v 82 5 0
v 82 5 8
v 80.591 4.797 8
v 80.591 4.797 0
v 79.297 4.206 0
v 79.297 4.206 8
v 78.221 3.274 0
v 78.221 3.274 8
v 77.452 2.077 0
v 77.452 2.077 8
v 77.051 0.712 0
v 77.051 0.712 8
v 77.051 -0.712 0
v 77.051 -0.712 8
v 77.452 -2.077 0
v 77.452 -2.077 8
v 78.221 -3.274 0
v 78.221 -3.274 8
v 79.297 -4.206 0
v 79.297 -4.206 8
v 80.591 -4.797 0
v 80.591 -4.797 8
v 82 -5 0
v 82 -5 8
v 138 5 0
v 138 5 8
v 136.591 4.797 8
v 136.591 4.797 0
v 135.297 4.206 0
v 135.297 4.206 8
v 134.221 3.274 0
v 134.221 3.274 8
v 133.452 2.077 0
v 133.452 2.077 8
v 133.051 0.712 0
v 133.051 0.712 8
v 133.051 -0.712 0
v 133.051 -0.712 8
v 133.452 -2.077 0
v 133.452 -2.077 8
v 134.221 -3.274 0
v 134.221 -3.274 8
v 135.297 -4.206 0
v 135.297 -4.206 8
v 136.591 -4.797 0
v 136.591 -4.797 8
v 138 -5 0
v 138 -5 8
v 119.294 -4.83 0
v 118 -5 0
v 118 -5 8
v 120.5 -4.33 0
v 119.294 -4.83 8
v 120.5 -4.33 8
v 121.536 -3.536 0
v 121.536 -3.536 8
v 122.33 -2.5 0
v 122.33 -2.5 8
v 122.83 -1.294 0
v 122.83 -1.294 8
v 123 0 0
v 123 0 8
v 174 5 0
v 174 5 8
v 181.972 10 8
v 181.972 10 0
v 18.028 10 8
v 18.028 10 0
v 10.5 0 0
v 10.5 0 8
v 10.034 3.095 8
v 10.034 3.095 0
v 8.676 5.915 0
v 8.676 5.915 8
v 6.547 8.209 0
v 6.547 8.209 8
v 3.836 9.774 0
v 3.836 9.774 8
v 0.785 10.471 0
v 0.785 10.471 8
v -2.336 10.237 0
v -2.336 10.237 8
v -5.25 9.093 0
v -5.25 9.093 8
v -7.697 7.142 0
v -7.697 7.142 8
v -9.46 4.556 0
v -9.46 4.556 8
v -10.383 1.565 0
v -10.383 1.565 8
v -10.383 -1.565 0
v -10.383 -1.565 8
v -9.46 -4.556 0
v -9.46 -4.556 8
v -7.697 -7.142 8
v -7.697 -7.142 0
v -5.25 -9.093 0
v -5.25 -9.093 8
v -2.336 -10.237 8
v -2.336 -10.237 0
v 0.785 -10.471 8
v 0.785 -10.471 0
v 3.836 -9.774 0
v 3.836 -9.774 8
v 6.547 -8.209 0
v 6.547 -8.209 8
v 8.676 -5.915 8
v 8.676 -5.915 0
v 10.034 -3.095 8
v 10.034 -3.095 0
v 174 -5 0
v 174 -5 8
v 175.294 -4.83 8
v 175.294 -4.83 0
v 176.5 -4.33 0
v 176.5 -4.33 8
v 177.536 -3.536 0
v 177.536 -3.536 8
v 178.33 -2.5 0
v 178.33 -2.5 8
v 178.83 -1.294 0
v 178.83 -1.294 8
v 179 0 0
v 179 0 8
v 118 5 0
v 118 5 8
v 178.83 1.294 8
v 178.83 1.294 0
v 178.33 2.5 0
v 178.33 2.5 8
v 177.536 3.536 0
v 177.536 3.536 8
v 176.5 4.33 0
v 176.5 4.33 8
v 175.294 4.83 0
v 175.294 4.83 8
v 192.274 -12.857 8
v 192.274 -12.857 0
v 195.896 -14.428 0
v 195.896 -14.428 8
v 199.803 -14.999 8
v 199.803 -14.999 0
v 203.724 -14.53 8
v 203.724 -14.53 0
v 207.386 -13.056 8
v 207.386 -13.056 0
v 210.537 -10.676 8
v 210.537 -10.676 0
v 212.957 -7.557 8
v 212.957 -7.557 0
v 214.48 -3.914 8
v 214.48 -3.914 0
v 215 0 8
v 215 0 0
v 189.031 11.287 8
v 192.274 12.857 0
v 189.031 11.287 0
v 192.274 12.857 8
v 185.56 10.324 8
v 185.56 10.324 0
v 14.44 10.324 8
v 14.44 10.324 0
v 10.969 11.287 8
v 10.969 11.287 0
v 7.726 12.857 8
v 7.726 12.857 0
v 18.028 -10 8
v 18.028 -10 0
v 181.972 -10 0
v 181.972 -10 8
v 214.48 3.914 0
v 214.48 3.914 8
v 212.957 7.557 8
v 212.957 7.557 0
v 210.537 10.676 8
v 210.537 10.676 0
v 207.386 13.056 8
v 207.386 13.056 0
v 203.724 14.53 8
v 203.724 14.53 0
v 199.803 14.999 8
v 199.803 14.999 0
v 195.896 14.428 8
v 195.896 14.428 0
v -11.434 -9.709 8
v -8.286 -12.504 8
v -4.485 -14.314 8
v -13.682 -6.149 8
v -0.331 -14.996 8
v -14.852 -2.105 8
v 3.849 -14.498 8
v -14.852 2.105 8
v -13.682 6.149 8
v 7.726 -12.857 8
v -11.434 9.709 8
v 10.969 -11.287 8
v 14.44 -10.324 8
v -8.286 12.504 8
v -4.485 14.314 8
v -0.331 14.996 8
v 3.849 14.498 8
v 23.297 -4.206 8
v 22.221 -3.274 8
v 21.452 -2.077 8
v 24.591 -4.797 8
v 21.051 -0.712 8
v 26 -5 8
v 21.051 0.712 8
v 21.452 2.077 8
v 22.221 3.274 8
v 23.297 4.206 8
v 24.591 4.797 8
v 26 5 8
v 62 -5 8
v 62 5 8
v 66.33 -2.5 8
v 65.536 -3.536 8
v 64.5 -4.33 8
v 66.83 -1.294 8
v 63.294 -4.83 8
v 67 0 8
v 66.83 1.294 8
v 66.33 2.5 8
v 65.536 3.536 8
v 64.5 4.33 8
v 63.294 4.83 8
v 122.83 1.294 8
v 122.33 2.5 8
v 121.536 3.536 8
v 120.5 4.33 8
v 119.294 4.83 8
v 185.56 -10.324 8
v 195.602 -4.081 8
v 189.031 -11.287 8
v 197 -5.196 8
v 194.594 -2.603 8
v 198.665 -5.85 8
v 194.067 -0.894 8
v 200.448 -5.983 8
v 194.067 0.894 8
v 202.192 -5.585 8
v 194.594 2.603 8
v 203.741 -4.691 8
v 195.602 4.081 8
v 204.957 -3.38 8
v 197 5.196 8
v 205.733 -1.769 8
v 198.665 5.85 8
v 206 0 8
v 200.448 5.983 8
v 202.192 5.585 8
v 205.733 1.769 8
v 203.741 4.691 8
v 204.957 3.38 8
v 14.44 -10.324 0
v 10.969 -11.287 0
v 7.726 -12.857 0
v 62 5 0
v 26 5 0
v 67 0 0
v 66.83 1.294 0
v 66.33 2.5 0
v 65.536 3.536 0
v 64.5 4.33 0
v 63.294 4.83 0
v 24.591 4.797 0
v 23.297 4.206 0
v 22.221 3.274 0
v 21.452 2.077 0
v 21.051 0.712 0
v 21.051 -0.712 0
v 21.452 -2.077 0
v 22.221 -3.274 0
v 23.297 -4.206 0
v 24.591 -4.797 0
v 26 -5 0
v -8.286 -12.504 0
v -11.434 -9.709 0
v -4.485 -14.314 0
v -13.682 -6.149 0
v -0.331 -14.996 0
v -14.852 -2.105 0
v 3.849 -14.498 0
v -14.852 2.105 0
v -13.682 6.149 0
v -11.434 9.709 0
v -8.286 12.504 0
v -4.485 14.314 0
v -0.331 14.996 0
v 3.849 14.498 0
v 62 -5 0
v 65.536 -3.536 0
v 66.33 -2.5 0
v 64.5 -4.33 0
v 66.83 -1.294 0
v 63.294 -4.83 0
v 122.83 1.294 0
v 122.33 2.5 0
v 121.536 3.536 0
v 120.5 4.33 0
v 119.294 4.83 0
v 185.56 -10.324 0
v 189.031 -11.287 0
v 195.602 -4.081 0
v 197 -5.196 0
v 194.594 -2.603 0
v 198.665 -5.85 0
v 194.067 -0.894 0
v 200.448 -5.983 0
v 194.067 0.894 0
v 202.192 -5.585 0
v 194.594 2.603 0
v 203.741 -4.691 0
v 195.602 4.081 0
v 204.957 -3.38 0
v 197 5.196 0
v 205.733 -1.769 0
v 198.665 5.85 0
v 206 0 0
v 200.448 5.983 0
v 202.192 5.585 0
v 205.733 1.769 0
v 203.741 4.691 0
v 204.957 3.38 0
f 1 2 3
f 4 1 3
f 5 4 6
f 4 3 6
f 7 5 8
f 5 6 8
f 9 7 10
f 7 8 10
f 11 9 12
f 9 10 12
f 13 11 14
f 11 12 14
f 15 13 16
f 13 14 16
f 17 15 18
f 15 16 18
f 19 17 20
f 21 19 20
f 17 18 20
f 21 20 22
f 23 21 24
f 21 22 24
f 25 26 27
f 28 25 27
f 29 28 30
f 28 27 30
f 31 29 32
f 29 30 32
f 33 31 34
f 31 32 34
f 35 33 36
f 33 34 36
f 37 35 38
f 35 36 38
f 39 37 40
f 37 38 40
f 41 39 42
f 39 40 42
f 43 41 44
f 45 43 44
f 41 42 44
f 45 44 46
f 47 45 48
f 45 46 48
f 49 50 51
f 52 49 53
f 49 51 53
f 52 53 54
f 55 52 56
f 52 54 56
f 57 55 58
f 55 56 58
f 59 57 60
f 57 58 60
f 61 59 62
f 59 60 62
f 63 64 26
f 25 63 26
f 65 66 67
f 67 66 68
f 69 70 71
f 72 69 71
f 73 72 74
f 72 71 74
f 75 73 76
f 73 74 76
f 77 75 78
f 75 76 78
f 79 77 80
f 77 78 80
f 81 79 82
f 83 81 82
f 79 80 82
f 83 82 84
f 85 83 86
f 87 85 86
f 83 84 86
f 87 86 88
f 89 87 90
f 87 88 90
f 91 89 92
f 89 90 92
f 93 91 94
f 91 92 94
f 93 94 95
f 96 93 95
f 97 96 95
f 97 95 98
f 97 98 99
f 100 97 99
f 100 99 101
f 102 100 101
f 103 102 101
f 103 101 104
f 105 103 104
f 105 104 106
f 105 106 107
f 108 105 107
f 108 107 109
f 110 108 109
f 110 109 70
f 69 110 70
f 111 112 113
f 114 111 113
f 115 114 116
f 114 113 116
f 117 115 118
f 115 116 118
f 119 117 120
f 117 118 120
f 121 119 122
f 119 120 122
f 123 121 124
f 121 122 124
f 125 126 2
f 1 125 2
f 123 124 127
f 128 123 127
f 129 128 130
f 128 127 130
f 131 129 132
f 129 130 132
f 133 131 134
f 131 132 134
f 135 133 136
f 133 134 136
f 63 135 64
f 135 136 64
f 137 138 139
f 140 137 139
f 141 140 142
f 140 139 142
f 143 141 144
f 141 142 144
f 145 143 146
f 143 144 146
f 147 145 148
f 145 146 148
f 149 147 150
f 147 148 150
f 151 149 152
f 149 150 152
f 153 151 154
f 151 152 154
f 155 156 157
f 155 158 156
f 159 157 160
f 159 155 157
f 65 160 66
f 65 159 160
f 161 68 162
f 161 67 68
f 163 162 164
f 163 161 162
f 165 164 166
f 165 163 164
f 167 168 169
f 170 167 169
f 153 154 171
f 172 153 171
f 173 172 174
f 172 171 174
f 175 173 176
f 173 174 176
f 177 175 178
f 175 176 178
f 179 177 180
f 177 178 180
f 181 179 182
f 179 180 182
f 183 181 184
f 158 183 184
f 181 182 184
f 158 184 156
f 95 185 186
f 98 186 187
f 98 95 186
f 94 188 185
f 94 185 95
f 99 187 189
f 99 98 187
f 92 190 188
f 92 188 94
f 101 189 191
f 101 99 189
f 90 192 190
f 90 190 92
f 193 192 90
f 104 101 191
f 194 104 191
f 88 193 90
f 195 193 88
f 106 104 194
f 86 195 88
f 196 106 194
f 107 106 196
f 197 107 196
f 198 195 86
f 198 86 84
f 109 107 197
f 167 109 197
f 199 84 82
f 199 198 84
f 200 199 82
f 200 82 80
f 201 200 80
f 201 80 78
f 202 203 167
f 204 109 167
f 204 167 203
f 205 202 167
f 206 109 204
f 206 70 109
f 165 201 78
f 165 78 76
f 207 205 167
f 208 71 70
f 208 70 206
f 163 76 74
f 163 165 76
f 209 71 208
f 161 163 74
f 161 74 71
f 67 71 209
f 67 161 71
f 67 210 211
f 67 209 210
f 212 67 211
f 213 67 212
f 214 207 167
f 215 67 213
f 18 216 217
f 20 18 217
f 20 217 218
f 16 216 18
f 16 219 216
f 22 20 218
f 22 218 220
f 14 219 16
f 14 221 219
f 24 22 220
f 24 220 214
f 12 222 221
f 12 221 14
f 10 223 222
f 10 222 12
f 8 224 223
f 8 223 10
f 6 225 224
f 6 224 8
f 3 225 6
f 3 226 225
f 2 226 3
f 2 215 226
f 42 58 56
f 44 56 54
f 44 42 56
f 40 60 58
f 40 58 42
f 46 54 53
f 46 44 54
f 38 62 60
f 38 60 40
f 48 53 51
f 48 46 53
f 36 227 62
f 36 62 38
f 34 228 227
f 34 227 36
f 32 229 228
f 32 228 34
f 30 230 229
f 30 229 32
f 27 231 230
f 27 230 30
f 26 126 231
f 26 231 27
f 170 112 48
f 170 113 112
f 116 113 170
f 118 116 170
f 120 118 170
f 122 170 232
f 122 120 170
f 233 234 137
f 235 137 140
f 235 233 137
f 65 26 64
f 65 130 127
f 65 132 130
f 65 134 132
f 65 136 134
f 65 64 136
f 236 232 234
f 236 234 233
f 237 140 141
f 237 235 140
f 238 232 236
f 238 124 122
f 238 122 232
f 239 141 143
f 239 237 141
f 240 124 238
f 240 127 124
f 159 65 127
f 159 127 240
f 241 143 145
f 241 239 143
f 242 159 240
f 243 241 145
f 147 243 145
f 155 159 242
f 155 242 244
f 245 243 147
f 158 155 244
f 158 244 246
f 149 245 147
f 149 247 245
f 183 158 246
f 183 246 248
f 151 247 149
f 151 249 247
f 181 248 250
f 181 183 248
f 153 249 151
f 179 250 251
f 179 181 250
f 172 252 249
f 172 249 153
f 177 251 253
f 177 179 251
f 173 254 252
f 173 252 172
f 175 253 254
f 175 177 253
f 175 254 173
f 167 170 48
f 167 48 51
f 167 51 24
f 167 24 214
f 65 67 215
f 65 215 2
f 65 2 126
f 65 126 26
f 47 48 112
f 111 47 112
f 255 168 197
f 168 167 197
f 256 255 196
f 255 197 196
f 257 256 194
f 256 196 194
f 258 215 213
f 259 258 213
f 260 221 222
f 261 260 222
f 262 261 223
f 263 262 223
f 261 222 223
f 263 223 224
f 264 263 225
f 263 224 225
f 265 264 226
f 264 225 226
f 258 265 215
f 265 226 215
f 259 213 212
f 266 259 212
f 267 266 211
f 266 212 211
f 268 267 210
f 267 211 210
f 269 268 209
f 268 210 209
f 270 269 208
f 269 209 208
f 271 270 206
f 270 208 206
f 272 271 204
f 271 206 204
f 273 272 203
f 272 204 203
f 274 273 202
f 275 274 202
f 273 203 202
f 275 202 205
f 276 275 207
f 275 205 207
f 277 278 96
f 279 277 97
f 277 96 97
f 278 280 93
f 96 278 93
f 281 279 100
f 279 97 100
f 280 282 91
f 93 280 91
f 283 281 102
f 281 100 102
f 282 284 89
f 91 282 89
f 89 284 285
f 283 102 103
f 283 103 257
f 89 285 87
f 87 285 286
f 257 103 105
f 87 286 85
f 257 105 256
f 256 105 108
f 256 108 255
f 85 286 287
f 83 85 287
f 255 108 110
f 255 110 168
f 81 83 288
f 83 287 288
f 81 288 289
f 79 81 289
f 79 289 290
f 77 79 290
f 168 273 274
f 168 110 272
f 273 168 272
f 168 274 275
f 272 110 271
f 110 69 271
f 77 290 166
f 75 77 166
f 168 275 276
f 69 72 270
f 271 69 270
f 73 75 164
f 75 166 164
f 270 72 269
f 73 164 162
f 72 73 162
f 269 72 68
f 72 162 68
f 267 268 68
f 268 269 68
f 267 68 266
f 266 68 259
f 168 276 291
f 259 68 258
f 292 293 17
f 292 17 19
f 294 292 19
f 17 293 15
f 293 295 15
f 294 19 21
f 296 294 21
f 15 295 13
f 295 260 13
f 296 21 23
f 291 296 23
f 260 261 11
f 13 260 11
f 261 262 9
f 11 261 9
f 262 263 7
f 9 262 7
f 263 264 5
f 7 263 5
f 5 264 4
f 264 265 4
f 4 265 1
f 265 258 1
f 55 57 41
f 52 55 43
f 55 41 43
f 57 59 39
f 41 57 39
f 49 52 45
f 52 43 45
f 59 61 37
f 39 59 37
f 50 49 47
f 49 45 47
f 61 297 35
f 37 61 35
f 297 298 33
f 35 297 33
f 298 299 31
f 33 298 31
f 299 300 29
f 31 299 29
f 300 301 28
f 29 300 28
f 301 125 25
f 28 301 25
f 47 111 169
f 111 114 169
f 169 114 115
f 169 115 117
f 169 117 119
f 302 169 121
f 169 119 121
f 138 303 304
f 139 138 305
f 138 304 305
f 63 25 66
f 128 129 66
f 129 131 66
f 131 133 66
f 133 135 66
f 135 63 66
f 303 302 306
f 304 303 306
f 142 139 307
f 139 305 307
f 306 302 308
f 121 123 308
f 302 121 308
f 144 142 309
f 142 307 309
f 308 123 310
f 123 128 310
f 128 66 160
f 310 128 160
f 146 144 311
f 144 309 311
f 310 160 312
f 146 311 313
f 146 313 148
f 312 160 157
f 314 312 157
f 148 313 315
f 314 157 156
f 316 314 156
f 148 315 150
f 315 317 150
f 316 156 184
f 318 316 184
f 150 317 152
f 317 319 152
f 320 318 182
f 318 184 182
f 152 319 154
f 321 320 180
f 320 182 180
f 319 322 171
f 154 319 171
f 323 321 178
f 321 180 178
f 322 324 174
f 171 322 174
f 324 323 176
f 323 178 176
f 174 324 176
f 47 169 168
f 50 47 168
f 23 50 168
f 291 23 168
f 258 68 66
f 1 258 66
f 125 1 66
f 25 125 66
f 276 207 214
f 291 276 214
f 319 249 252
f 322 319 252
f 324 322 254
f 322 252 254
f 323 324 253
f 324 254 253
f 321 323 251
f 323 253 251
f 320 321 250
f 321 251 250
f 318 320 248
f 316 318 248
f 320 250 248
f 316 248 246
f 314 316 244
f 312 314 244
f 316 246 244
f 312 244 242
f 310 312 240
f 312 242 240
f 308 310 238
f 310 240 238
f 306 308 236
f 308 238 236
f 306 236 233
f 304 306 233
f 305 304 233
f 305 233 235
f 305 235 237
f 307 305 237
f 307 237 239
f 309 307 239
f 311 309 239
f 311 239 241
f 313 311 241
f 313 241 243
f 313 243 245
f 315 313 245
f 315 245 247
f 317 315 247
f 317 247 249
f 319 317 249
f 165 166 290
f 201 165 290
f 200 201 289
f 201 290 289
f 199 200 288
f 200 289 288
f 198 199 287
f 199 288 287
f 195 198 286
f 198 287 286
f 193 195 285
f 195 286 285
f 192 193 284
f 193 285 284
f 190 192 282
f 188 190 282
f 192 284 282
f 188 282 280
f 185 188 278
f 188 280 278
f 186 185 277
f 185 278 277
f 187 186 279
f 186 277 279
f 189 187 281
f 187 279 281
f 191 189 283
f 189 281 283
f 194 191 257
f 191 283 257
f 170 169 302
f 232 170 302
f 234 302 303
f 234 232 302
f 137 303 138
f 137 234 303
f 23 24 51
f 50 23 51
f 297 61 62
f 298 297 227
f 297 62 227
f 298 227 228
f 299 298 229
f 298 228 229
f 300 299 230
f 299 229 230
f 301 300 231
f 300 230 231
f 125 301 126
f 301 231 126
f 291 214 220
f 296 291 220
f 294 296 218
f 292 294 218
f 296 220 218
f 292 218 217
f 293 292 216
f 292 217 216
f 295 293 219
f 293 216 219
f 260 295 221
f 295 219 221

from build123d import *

# Parameters (mm, degrees)
EXTRUDE_1_DEPTH     = 8
FILLET_1_R          = 20
SKETCH_5_R          = 10.5
SKETCH_5_R_2        = 6
CUT_EXTRUDE_4_DEPTH = 10
CUT_EXTRUDE_5_DEPTH = 10


with BuildPart() as part:
    # 草图1 → 凸台-拉伸1 (new body)
    with BuildSketch(Plane.XY):
        with BuildLine():
            Line((0, -10), (0, 10))
            Line((0, 10), (11.180339887, 10))
            ThreePointArc((11.180339887, 10), (-15, 0), (11.180339887, -10))
            Line((11.180339887, -10), (0, -10))
        make_face()
        with BuildLine():
            Line((11.180339887, 10), (0, 10))
            Line((0, 10), (0, -10))
            Line((0, -10), (11.180339887, -10))
            ThreePointArc((11.180339887, -10), (14.012585384, -5.352331347), (15, 0))
            ThreePointArc((15, 0), (14.012585384, 5.352331347), (11.180339887, 10))
        make_face()
        with BuildLine():
            Line((188.819660113, 10), (11.180339887, 10))
            ThreePointArc((11.180339887, 10), (14.012585384, 5.352331347), (15, 0))
            ThreePointArc((15, 0), (14.012585384, -5.352331347), (11.180339887, -10))
            Line((11.180339887, -10), (188.819660113, -10))
            ThreePointArc((188.819660113, -10), (185, 0), (188.819660113, 10))
        make_face()
        with BuildLine():
            ThreePointArc((215, 0), (205.352331347, 14.012585384), (188.819660113, 10))
            Line((188.819660113, 10), (200, 10))
            Line((200, 10), (200, -10))
            Line((200, -10), (188.819660113, -10))
            ThreePointArc((188.819660113, -10), (205.352331347, -14.012585384), (215, 0))
        make_face()
        with BuildLine():
            Line((200, 10), (188.819660113, 10))
            ThreePointArc((188.819660113, 10), (185, 0), (188.819660113, -10))
            Line((188.819660113, -10), (200, -10))
            Line((200, -10), (200, 10))
        make_face()
    extrude(amount=EXTRUDE_1_DEPTH)

    # 圆角1
    fillet_1_edges = [part.edges().sort_by_distance(p)[0] for p in [
        (11.180339887, 10, 4),
        (188.819660113, 10, 4),
        (188.819660113, -10, 4),
        (11.180339887, -10, 4),
    ]]
    fillet(fillet_1_edges, radius=FILLET_1_R)

    # 草图5 → 切除-拉伸4 (cut)
    with BuildSketch(Plane.XY.offset(8)):
        Circle(SKETCH_5_R)
        with Locations((200, 0)):
            Circle(SKETCH_5_R_2)
    extrude(amount=-CUT_EXTRUDE_4_DEPTH, mode=Mode.SUBTRACT)

    # 草图6 → 切除-拉伸5 (cut)
    with BuildSketch(Plane.XY.offset(8)):
        with BuildLine():
            ThreePointArc((31, 0), (29.535533906, -3.535533906), (26, -5))
            Line((26, -5), (62, -5))
            ThreePointArc((62, -5), (57, 0), (62, 5))
            Line((62, 5), (26, 5))
            ThreePointArc((26, 5), (29.535533906, 3.535533906), (31, 0))
        make_face()
        with BuildLine():
            ThreePointArc((26, 5), (21, 0), (26, -5))
            Line((26, -5), (26, 5))
        make_face()
        with BuildLine():
            Line((26, 5), (26, -5))
            ThreePointArc((26, -5), (29.535533906, -3.535533906), (31, 0))
            ThreePointArc((31, 0), (29.535533906, 3.535533906), (26, 5))
        make_face()
        with BuildLine():
            ThreePointArc((62, 5), (57, 0), (62, -5))
            Line((62, -5), (62, 5))
        make_face()
        with BuildLine():
            Line((62, 5), (62, -5))
            ThreePointArc((62, -5), (65.535533906, -3.535533906), (67, 0))
            ThreePointArc((67, 0), (65.535533906, 3.535533906), (62, 5))
        make_face()
        with BuildLine():
            ThreePointArc((82, 5), (77, 0), (82, -5))
            Line((82, -5), (82, 5))
        make_face()
        with BuildLine():
            Line((82, 5), (82, -5))
            ThreePointArc((82, -5), (85.535533906, -3.535533906), (87, 0))
            ThreePointArc((87, 0), (85.535533906, 3.535533906), (82, 5))
        make_face()
        with BuildLine():
            ThreePointArc((87, 0), (85.535533906, -3.535533906), (82, -5))
            Line((82, -5), (118, -5))
            ThreePointArc((118, -5), (113, 0), (118, 5))
            Line((118, 5), (82, 5))
            ThreePointArc((82, 5), (85.535533906, 3.535533906), (87, 0))
        make_face()
        with BuildLine():
            ThreePointArc((118, 5), (113, 0), (118, -5))
            Line((118, -5), (118, 5))
        make_face()
        with BuildLine():
            Line((118, 5), (118, -5))
            ThreePointArc((118, -5), (121.535533906, -3.535533906), (123, 0))
            ThreePointArc((123, 0), (121.535533906, 3.535533906), (118, 5))
        make_face()
        with BuildLine():
            ThreePointArc((138, 5), (133, 0), (138, -5))
            Line((138, -5), (138, 5))
        make_face()
        with BuildLine():
            Line((138, 5), (138, -5))
            ThreePointArc((138, -5), (141.535533906, -3.535533906), (143, 0))
            ThreePointArc((143, 0), (141.535533906, 3.535533906), (138, 5))
        make_face()
        with BuildLine():
            ThreePointArc((143, 0), (141.535533906, -3.535533906), (138, -5))
            Line((138, -5), (174, -5))
            ThreePointArc((174, -5), (169, 0), (174, 5))
            Line((174, 5), (138, 5))
            ThreePointArc((138, 5), (141.535533906, 3.535533906), (143, 0))
        make_face()
        with BuildLine():
            ThreePointArc((174, 5), (169, 0), (174, -5))
            Line((174, -5), (174, 5))
        make_face()
        with BuildLine():
            Line((174, 5), (174, -5))
            ThreePointArc((174, -5), (177.535533906, -3.535533906), (179, 0))
            ThreePointArc((179, 0), (177.535533906, 3.535533906), (174, 5))
        make_face()
    extrude(amount=-CUT_EXTRUDE_5_DEPTH, mode=Mode.SUBTRACT)


solid = part.part
